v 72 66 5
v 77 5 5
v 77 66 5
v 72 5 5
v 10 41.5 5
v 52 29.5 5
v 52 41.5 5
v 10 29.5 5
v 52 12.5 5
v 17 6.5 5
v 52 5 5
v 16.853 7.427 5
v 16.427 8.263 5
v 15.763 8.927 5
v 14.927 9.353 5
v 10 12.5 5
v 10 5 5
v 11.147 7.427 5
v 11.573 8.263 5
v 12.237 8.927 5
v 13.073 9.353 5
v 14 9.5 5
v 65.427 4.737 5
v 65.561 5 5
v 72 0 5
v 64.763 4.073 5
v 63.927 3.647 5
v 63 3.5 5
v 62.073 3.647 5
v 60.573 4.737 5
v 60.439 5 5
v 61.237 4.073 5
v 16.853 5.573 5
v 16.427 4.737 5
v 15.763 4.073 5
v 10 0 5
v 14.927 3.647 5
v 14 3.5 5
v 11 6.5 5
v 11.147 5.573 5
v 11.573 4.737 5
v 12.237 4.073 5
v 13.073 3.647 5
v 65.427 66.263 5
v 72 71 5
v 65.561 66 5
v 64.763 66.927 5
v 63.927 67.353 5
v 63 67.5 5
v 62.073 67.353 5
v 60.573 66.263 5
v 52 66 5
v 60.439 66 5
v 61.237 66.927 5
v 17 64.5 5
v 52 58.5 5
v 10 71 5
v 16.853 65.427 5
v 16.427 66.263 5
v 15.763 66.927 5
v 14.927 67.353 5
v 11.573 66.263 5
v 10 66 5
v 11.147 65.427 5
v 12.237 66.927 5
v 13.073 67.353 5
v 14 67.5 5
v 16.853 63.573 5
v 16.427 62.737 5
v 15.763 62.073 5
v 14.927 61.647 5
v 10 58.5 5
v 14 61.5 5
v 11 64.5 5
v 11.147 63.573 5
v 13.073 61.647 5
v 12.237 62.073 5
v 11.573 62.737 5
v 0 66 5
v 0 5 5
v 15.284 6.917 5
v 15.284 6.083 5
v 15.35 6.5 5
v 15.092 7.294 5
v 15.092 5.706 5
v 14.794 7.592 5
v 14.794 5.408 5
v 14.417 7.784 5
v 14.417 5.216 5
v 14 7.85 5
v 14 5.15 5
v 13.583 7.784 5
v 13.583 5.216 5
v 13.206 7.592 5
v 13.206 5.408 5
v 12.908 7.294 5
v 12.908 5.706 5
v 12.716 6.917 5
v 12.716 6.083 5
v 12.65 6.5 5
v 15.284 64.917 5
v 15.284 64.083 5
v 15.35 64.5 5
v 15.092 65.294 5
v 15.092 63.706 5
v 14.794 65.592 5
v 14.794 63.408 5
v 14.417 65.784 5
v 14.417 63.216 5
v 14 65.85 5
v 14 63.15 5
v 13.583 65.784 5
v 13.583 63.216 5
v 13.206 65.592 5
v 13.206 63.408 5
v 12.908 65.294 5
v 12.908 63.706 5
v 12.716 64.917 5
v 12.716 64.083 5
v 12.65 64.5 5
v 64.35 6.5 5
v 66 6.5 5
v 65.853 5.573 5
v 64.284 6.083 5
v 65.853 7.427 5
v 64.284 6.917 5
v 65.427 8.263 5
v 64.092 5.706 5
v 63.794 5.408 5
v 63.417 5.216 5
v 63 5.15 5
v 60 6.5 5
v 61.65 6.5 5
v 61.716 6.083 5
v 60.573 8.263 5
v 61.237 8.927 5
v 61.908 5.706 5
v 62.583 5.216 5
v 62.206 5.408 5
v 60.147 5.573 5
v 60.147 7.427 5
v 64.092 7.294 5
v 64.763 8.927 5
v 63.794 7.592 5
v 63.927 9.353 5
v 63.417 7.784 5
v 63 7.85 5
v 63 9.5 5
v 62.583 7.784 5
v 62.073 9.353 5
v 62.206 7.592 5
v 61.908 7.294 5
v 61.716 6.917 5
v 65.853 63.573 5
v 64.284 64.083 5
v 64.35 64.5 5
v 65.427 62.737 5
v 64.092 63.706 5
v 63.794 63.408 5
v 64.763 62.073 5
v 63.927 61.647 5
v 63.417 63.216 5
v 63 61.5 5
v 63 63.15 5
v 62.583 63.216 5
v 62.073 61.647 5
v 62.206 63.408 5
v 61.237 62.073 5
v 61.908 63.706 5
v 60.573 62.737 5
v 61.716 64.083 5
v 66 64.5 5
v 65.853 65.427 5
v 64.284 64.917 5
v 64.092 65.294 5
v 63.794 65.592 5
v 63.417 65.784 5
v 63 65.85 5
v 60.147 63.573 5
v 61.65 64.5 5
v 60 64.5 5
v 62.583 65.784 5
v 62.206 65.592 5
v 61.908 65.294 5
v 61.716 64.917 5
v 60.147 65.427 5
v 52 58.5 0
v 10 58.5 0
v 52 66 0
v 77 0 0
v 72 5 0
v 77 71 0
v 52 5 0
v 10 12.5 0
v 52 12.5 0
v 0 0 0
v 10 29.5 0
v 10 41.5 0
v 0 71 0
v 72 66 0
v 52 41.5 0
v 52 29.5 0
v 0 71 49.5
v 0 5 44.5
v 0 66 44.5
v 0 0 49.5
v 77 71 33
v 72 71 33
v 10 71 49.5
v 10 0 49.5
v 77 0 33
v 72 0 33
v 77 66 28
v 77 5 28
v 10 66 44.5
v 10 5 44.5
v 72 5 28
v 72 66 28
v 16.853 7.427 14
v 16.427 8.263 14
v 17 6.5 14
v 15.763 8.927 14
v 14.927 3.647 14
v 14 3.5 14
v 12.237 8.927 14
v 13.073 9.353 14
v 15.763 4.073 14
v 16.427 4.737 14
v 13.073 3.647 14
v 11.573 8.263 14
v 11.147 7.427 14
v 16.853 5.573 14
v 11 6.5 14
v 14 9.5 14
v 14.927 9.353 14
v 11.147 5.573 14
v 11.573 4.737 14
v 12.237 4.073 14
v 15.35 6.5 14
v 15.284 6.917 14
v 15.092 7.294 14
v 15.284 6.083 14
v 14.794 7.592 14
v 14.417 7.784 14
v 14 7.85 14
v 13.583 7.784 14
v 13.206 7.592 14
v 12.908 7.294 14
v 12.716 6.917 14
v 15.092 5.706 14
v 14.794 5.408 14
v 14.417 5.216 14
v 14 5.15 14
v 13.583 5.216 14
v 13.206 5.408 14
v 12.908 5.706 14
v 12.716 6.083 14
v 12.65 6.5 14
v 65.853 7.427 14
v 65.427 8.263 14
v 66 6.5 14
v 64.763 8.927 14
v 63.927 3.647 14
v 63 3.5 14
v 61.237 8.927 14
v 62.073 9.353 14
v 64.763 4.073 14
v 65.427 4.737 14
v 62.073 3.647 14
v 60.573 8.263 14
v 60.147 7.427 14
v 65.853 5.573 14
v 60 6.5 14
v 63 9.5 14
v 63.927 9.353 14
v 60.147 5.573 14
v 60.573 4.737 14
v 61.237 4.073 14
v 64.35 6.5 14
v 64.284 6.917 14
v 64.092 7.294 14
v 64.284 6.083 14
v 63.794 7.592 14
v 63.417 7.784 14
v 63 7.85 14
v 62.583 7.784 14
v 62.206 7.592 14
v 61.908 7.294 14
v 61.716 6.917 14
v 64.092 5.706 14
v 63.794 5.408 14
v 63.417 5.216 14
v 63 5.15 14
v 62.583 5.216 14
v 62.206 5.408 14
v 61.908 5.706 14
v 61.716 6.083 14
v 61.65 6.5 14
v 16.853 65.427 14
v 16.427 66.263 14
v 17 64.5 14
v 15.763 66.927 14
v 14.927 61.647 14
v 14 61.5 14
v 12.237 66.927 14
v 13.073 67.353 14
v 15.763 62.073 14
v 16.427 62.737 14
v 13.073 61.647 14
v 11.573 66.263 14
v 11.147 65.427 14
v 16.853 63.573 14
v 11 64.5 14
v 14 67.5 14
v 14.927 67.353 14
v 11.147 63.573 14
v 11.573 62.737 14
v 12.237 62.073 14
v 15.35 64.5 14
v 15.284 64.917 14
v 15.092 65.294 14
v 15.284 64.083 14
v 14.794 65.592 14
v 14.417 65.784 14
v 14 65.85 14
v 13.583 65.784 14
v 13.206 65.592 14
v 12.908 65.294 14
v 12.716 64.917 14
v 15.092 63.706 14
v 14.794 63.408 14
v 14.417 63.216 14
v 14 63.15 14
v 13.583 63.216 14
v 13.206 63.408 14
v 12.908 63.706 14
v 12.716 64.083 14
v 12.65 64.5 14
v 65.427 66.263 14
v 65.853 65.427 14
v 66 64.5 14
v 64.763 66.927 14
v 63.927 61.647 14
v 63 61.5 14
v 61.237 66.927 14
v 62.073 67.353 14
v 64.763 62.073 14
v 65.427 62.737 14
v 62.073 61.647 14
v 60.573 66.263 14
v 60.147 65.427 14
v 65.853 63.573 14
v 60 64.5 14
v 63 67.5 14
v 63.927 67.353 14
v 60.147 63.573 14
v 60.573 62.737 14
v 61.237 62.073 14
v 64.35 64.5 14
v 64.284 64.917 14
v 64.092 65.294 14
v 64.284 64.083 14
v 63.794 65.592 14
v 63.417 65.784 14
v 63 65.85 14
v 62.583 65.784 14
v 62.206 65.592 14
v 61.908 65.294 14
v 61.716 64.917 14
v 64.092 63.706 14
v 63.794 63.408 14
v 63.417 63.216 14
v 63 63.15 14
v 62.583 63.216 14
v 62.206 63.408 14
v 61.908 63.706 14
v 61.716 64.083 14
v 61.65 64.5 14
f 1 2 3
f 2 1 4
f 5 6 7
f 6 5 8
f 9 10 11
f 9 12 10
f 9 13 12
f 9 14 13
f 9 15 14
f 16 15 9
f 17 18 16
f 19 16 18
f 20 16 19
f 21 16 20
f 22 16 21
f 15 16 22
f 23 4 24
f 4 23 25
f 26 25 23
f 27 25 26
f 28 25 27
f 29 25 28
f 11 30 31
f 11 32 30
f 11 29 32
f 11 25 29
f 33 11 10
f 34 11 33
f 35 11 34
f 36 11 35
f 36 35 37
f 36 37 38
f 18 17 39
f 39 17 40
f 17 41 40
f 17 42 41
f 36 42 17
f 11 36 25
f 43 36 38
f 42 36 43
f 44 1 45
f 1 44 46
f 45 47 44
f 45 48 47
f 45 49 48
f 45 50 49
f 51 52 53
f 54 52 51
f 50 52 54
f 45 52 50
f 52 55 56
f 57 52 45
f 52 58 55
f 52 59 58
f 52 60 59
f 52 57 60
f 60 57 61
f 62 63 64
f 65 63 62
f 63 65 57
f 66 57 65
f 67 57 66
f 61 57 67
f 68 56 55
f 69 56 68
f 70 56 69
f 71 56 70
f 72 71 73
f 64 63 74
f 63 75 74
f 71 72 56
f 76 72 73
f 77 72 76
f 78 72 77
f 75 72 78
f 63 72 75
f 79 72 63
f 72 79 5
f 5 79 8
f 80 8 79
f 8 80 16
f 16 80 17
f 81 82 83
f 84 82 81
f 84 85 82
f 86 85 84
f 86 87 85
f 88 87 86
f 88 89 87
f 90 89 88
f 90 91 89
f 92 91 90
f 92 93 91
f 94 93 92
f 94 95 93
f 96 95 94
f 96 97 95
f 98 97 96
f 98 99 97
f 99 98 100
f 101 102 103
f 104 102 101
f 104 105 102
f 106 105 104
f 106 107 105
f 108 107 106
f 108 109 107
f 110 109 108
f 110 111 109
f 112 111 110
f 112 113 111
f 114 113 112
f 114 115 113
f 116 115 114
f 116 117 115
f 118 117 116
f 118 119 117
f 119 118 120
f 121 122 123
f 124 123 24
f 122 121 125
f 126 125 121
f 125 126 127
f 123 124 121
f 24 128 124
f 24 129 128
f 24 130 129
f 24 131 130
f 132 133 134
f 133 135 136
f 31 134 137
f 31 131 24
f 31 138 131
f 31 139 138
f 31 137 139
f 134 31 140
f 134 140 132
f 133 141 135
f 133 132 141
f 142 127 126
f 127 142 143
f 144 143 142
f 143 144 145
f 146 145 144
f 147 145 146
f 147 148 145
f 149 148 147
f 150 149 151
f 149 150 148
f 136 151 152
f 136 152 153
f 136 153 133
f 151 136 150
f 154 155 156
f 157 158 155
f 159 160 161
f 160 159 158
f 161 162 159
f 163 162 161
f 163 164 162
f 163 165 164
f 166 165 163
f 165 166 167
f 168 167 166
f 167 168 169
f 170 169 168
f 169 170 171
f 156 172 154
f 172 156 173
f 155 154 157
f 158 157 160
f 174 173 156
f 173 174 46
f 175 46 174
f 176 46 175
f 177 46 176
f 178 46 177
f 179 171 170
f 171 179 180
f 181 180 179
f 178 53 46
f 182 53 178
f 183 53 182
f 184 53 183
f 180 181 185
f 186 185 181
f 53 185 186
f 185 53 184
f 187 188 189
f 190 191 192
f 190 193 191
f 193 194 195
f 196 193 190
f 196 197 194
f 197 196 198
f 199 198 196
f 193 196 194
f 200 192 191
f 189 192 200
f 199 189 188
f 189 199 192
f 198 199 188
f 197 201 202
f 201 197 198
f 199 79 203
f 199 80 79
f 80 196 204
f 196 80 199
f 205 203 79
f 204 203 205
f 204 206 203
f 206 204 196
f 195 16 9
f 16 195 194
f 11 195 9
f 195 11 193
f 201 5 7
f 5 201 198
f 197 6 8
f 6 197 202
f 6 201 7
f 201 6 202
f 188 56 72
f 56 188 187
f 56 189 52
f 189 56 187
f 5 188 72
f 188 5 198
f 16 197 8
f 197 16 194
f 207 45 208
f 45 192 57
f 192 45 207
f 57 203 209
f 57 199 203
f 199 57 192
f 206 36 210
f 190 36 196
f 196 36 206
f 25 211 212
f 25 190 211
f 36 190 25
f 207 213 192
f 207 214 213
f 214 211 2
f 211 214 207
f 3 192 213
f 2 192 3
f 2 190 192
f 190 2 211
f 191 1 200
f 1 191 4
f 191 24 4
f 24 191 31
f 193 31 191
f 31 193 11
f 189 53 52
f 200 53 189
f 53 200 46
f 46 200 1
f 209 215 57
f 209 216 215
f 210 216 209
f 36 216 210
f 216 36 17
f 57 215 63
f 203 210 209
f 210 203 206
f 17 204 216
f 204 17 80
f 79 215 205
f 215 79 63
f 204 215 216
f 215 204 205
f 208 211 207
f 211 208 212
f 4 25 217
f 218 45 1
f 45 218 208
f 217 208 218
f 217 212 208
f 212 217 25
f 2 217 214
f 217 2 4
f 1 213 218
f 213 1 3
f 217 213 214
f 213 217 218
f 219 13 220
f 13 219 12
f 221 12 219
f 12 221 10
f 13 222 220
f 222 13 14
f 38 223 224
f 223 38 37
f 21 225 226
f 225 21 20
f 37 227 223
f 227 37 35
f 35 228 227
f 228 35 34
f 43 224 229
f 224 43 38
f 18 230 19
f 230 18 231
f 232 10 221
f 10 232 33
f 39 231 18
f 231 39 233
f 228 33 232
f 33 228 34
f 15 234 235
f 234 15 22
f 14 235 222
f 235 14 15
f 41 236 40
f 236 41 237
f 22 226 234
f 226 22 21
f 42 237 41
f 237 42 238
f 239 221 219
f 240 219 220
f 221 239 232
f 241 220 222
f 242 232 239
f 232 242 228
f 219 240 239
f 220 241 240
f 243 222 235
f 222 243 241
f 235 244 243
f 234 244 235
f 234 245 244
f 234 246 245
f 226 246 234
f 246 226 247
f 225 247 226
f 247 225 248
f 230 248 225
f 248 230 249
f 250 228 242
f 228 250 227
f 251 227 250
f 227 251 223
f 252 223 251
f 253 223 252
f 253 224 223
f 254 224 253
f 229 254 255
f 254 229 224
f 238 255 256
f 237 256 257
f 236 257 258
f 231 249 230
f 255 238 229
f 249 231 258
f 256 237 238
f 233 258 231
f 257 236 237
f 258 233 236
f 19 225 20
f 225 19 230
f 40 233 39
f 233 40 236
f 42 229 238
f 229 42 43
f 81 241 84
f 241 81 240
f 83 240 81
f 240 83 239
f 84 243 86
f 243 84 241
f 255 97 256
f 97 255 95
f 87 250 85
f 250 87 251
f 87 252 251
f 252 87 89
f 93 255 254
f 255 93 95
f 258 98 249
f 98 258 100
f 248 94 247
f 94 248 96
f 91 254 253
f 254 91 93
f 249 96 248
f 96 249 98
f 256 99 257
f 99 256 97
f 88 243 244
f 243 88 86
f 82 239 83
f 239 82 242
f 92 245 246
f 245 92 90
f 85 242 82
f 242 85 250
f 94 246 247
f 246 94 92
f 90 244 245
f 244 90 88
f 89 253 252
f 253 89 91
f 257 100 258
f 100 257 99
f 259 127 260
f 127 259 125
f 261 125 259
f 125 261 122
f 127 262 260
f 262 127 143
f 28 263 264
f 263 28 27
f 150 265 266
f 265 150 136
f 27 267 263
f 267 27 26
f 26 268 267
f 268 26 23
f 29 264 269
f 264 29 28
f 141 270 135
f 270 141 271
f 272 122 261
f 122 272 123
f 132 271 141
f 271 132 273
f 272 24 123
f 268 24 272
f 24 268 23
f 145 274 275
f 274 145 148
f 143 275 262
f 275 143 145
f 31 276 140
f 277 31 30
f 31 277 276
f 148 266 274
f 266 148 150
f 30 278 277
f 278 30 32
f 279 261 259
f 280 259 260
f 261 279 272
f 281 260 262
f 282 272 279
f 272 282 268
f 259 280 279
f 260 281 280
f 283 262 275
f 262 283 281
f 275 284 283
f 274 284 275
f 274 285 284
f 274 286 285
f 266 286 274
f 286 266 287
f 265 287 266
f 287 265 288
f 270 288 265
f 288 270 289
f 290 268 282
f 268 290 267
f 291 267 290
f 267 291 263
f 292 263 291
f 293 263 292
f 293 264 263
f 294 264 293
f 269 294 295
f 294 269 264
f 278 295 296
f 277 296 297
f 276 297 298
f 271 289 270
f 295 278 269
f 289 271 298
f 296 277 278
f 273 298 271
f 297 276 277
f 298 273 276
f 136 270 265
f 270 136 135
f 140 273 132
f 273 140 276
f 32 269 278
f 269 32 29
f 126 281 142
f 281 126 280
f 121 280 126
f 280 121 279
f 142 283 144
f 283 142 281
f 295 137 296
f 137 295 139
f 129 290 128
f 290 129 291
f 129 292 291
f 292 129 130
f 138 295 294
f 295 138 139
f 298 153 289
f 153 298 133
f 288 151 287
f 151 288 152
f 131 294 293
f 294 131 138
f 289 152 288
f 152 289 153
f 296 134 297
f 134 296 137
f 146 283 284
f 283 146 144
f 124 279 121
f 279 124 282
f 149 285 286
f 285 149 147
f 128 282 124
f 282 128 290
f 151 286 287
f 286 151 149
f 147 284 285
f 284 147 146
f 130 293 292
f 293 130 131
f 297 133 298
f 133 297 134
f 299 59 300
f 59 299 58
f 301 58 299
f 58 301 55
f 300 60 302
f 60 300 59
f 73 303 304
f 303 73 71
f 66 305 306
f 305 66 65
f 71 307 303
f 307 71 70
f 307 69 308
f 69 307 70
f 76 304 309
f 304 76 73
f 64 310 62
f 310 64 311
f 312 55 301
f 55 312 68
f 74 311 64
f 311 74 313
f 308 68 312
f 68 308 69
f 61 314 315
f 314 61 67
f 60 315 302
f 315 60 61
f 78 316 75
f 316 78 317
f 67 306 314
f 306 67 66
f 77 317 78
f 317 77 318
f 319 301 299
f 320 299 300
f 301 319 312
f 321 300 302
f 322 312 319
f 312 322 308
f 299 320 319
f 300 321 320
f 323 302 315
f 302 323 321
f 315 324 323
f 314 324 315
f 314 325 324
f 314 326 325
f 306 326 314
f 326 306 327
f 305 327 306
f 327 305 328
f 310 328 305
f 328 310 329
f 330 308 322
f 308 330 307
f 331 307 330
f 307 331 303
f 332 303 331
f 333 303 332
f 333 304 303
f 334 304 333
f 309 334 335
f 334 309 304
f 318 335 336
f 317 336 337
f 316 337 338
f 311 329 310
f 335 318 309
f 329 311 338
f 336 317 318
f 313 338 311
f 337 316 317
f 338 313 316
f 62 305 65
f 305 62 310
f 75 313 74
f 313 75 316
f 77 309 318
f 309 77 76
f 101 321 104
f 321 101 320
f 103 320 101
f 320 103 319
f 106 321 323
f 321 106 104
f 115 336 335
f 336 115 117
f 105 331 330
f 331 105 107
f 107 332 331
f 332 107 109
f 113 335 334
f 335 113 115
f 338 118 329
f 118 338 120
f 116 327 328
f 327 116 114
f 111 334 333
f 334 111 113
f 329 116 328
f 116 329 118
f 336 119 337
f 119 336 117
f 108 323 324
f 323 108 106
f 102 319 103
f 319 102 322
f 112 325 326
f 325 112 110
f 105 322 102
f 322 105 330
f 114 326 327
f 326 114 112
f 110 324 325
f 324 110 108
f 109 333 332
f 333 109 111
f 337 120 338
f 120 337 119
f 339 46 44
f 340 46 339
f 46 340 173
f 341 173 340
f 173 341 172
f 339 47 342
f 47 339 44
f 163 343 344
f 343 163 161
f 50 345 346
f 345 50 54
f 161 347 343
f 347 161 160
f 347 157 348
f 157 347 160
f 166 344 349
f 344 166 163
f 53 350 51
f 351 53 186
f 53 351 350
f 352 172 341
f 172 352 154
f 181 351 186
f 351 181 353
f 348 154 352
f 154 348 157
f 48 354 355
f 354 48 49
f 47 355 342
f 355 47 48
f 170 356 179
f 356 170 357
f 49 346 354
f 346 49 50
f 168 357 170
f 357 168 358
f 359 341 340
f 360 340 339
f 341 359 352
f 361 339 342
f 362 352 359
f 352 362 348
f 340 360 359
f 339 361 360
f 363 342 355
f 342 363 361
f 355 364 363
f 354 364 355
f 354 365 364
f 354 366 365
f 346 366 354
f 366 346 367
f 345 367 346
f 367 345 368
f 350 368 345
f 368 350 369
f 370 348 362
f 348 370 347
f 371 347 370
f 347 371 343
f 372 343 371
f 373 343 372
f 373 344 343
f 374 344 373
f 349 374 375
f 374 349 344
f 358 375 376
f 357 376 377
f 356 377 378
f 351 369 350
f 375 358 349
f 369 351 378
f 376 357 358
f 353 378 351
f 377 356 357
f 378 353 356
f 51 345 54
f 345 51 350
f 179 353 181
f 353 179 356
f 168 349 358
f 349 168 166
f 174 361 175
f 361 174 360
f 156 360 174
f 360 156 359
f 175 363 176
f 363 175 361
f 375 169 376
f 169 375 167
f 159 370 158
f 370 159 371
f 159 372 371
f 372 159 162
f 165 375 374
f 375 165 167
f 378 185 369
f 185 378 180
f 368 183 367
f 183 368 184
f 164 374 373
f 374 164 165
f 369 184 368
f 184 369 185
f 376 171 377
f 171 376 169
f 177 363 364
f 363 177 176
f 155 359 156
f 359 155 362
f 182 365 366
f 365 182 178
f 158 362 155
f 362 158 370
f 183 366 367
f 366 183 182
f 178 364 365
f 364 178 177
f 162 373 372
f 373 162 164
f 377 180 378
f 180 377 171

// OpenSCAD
// Neato XV Signature Pro - Outer Left Pod
// Mounts: Yahboom PD Power Expansion Board
// Location: outer left (exposed edge), viewed from behind robot
//
// ORIENTATION:
//   Bottom face = velcros to robot chassis (print this face on bed)
//   Posts extend upward (away from chassis)
//   Open: top, front, back
//   Protected: left and right sides with edge rails
//   Extra thick outer (left) rail for protection on exposed edge
//   Battery cable notch on inner (right) edge
//
// All measurements in mm. Print in PLA, no supports needed.

// ============================================================
// PARAMETERS
// ============================================================

// Yahboom board: 65mm long x 56mm wide (rotated 90° — long axis runs along Y/depth).
// Walls on X axis (short board dimension): pod_width = 56 + 3 + 3 + outer_rail_w + rail_w = 77mm
// Open on Y axis (long board dimension): pod_depth = 65 + 3 + 3 = 71mm
pod_width  = 77;
pod_depth  = 71;
pod_height = 66;

rail_w       = 5;
outer_rail_w = 10; // extra thick exposed outer edge

rib_w = 12; // wide enough that standoff (6mm dia) sits fully centered with 3mm to spare each side

standoff_h    = 9;
standoff_od   = 6;
standoff_hole = 2.7; // M2.5 for Yahboom

cable_notch_w = 25;
cable_notch_d = 20;

// Yahboom hole pattern: 49mm x 58mm (rotated — short span on X, long span on Y)
// Standoffs placed at exactly these positions, centered in pod.
// Ribs move to match standoffs.
yahboom_hole_x_span = 49;
yahboom_hole_y_span = 58;

yahboom_x_left  = (pod_width - yahboom_hole_x_span) / 2;  // 18.5mm from left
yahboom_x_right = yahboom_x_left + yahboom_hole_x_span;   // 76.5mm from left

yahboom_y_front = (pod_depth - yahboom_hole_y_span) / 2;  // 7mm from front
yahboom_y_rear  = yahboom_y_front + yahboom_hole_y_span;  // 56mm from front
yahboom_y_mid   = (yahboom_y_front + yahboom_y_rear) / 2; // 31.5mm — center structural rib

// Ribs centered exactly on standoff Y positions
rib_positions = [yahboom_y_front, yahboom_y_mid, yahboom_y_rear];

yahboom_holes = [
    [yahboom_x_left,  yahboom_y_front],
    [yahboom_x_right, yahboom_y_front],
    [yahboom_x_left,  yahboom_y_rear ],
    [yahboom_x_right, yahboom_y_rear ],
];

// ============================================================
// MODULES
// ============================================================

module ribbed_bottom() {
    // Outer (left) edge — extra thick
    cube([outer_rail_w, pod_depth, rail_w]);
    // Inner (right) edge
    translate([pod_width - rail_w, 0, 0])
        cube([rail_w, pod_depth, rail_w]);
    // Back edge
    cube([pod_width, rail_w, rail_w]);
    // Front edge
    translate([0, pod_depth - rail_w, 0])
        cube([pod_width, rail_w, rail_w]);

    // Ribs centered on standoff Y positions, with battery cable notch on inner (right) edge
    for (y_center = rib_positions) {
        y = y_center - rib_w / 2;
        difference() {
            translate([0, y, 0])
                cube([pod_width, rib_w, rail_w]);
            // Notch cuts into the inner (right) edge for battery cable routing
            translate([pod_width - cable_notch_w, y - 0.1, -0.1])
                cube([cable_notch_w + 0.1, rib_w + 0.2, rail_w + 0.2]);
        }
    }
}

module side_rails() {
    outer_wall_h = pod_height * 0.75;  // ~50mm — protection on exposed edge
    inner_wall_h = pod_height * 0.50;  // ~33mm — wire routing access

    // Outer (left) side — extra thick, taller, no center post
    cube([outer_rail_w, rail_w, outer_wall_h]);                            // back post
    translate([0, pod_depth - rail_w, 0])
        cube([outer_rail_w, rail_w, outer_wall_h]);                        // front post
    translate([0, 0, outer_wall_h - rail_w])
        cube([outer_rail_w, pod_depth, rail_w]);                           // top horizontal

    // Inner (right) side — half height, no center post, wire routing access
    translate([pod_width - rail_w, 0, 0])
        cube([rail_w, rail_w, inner_wall_h]);                              // back post
    translate([pod_width - rail_w, pod_depth - rail_w, 0])
        cube([rail_w, rail_w, inner_wall_h]);                              // front post
    translate([pod_width - rail_w, 0, inner_wall_h - rail_w])
        cube([rail_w, pod_depth, rail_w]);                                 // top horizontal
}

module standoff(h, hole_d) {
    difference() {
        cylinder(h=h, d=standoff_od, $fn=20);
        cylinder(h=h + 0.1, d=hole_d, $fn=20);
    }
}

// ============================================================
// MAIN
// ============================================================

union() {
    ribbed_bottom();
    side_rails();

    for (h = yahboom_holes) {
        translate([h[0], h[1], rail_w])
            standoff(standoff_h, standoff_hole);
    }
}
